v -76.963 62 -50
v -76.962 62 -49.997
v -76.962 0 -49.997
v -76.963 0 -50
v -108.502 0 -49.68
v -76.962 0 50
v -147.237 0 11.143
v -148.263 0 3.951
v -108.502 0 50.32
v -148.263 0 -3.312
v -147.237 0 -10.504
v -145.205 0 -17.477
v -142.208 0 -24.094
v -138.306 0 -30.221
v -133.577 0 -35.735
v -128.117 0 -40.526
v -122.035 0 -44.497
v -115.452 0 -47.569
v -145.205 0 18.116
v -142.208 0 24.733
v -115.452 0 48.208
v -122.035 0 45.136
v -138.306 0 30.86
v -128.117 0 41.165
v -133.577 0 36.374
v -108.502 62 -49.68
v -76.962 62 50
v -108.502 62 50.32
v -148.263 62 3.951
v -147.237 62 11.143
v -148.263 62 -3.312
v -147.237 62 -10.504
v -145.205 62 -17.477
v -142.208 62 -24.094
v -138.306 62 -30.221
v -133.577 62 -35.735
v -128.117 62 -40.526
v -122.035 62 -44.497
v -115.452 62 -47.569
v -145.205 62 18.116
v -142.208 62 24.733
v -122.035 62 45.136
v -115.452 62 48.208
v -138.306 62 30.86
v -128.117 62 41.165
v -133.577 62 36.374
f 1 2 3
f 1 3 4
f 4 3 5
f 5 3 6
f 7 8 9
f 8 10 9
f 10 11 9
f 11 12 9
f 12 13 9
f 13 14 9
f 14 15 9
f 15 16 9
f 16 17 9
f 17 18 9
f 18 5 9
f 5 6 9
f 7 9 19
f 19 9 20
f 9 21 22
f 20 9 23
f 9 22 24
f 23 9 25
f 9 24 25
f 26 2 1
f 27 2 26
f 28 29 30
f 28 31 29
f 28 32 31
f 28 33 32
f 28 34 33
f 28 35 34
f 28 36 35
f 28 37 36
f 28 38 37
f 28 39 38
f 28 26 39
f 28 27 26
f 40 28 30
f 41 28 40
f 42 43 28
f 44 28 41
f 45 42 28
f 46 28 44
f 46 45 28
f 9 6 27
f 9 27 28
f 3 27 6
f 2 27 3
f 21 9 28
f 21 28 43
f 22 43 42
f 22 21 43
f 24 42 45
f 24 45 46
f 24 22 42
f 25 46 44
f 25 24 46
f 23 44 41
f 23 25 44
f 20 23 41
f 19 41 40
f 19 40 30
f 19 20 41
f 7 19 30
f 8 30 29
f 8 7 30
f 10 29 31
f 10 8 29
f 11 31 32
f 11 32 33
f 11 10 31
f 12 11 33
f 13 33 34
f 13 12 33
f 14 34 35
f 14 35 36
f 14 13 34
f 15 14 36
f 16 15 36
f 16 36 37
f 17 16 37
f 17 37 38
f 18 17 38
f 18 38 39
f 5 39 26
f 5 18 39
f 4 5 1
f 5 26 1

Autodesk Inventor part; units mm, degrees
ref_plane "YZ Plane" through (0, 0, 0) normal (1, 0, 0) x (0, 1, 0)
ref_plane "XZ Plane" through (0, 0, 0) normal (0, 1, 0) x (-1, 0, 0)
ref_plane "XY Plane" through (0, 0, 0) normal (0, 0, 1) x (1, 0, 0)
sketch "Sketch1" plane through (0, 0, 0) normal (0, 1, 0) x (-1, 0, 0)
  line L0 (25, 100) -> (-25, 100)
  line L1 (-25, 100) -> (-25, -100)
  line L2 (-25, -100) -> (25, -100)
  line L3 (25, -100) -> (25, 100)
  line L4 (25, 100) -> (-25, -100) construction
  line L5 (-25, 100) -> (25, -100) construction
  point P0 (0, 0)
  dimension "d0" = 50
  dimension "d1" = 200
extrude "Extrusion1" add sketch "Sketch1" along normal blind 62
sketch "Sketch2" plane through (-25, 0, 100) normal (0, 0, 1) x (1, 0, 0)
  line L0 (50, 62) -> (0, 62) projected
  line L1 (50, 62) -> (90, 62)
  line L2 (90, 62) -> (90, 42)
  line L3 (90, 42) -> (53.2289, 0)
  line L4 (53.2289, 0) -> (50, 0)
  line L5 (50, 62) -> (50, 0)
  point P0 (25, 0)
  dimension "d4" = 40
  dimension "d5" = 20
  dimension "d6" = 90
extrude "Extrusion2" add sketch "Sketch2" against normal up to surface (200 mm away)
sketch "Sketch3" plane through (0, 62, 0) normal (0, 1, 0) x (1, 0, 0)
  line L0 (-25, 100) -> (-25, -100) projected
  line L1 (-25, -100) -> (-25, 100)
  line L2 (-25, 100) -> (-25, 80)
  line L3 (-25, 80) -> (-76.9615, 50)
  line L4 (-25, -100) -> (-25, -80)
  line L5 (-25, -80) -> (-76.9615, -50)
  line L6 (-76.9615, -50) -> (-76.9615, 50)
  circle A0 centre (-76.9615, 0) radius 49.9974
  circle A1 centre (-126.9564, -0.5064) radius 49.9974
  line L7 (-76.9615, -50) -> (-126.45, -50.5013)
  line L8 (-127.4628, 49.4885) -> (-76.9615, 50)
  point P0 (0, 0)
  point P1 (-76.9615, 49.9974)
  point P2 (-77.4679, 49.9949)
  point P3 (-76.9615, -1.0128)
  dimension "d9" = 20
  dimension "d10" = 60
  dimension "d11" = 120
  dimension "d12" = 20
  dimension "d13" = 60
  dimension "d14" = 120
extrude "Extrusion3" add sketch "Sketch3" against normal blind 62
sketch "Sketch4" plane through (0, 62, 0) normal (0, 1, 0) x (1, 0, 0)
  line L0 (-25, -100) -> (28.2289, -100) projected
  line L1 (-25, 100) -> (-25, 80) projected
  line L2 (-25, -100) -> (-25, 100)
  line L3 (-25, 100) -> (29.4775, 197.567)
  line L4 (29.4775, 197.567) -> (135.6867, 127.811)
  line L5 (135.6867, 127.811) -> (135.6867, -104.409)
  line L6 (135.6867, -104.409) -> (110.0345, -245.7212)
  line L7 (110.0345, -245.7212) -> (-5.1754, -156.6135)
  line L8 (-5.1754, -156.6135) -> (-25, -100)
  line L9 (-76.9615, -50) -> (-76.9615, 49.9974)
  line L10 (-76.9615, 49.9974) -> (-143.8651, 145.0549)
  line L11 (-143.8651, 145.0549) -> (-248.9816, -0.0013)
  line L12 (-248.9816, -0.0013) -> (-240.1494, -166.1828)
  line L13 (-240.1494, -166.1828) -> (-110.4133, -169.4443)
  line L14 (-110.4133, -169.4443) -> (-76.9615, -50)
  line L15 (-110.4133, -169.4443) -> (-5.1754, -156.6135)
  line L16 (-143.8651, 145.0549) -> (29.4775, 197.567)
  point P0 (0, 0)
extrude "Extrusion4" cut sketch "Sketch4" against normal blind 62 contours L3 L4 L5 L6 L7 L8 L2 L1 | L1 L2 L8 L15 L14 L9 L10 L16 L3
extrude "Extrusion5" cut sketch "Sketch4" against normal blind 62 contours L3 L4 L5 L6 L7 L8 L2 L1 | L1 L2 L8 L15 L14 L9 L10 L16 L3
sketch "Sketch5" plane through (0, 0, 0) normal (0, -1, 0) x (1, 0, 0)
  arc A0 (-77.4679, -49.9949) -> (-76.9615, -49.9974) centre (-76.9615, 0) ccw projected
  line L0 (-76.9615, -49.9974) -> (-76.9615, 49.9974)
  circle A1 centre (-76.9615, 0) radius 49.9974
  line L1 (-76.9615, 50) -> (-126.45, 50.5013) projected
  line L2 (-127.4628, -49.4885) -> (-77.4679, -49.9949) projected
  arc A2 (-108.502, 50.3195) -> (-108.502, -49.6805) centre (-97.1108, 0.3195) ccw
  line L3 (-108.502, -49.6805) -> (-108.502, 50.3195) construction
  line L4 (-108.502, -49.6805) -> (-8.502, -49.6805) construction
  line L5 (-108.502, -49.6805) -> (-108.502, 50.3195)
  arc A3 (-108.502, 50.3195) -> (-108.502, -49.6805) centre (-131.0507, 0.3195) ccw
  point P0 (0, 0)
  dimension "d21" = 90
extrude "Extrusion6" cut sketch "Sketch5" against normal blind 62 contours A3 A2
properties part number "piece3" material "Acetal Resin, Black"
